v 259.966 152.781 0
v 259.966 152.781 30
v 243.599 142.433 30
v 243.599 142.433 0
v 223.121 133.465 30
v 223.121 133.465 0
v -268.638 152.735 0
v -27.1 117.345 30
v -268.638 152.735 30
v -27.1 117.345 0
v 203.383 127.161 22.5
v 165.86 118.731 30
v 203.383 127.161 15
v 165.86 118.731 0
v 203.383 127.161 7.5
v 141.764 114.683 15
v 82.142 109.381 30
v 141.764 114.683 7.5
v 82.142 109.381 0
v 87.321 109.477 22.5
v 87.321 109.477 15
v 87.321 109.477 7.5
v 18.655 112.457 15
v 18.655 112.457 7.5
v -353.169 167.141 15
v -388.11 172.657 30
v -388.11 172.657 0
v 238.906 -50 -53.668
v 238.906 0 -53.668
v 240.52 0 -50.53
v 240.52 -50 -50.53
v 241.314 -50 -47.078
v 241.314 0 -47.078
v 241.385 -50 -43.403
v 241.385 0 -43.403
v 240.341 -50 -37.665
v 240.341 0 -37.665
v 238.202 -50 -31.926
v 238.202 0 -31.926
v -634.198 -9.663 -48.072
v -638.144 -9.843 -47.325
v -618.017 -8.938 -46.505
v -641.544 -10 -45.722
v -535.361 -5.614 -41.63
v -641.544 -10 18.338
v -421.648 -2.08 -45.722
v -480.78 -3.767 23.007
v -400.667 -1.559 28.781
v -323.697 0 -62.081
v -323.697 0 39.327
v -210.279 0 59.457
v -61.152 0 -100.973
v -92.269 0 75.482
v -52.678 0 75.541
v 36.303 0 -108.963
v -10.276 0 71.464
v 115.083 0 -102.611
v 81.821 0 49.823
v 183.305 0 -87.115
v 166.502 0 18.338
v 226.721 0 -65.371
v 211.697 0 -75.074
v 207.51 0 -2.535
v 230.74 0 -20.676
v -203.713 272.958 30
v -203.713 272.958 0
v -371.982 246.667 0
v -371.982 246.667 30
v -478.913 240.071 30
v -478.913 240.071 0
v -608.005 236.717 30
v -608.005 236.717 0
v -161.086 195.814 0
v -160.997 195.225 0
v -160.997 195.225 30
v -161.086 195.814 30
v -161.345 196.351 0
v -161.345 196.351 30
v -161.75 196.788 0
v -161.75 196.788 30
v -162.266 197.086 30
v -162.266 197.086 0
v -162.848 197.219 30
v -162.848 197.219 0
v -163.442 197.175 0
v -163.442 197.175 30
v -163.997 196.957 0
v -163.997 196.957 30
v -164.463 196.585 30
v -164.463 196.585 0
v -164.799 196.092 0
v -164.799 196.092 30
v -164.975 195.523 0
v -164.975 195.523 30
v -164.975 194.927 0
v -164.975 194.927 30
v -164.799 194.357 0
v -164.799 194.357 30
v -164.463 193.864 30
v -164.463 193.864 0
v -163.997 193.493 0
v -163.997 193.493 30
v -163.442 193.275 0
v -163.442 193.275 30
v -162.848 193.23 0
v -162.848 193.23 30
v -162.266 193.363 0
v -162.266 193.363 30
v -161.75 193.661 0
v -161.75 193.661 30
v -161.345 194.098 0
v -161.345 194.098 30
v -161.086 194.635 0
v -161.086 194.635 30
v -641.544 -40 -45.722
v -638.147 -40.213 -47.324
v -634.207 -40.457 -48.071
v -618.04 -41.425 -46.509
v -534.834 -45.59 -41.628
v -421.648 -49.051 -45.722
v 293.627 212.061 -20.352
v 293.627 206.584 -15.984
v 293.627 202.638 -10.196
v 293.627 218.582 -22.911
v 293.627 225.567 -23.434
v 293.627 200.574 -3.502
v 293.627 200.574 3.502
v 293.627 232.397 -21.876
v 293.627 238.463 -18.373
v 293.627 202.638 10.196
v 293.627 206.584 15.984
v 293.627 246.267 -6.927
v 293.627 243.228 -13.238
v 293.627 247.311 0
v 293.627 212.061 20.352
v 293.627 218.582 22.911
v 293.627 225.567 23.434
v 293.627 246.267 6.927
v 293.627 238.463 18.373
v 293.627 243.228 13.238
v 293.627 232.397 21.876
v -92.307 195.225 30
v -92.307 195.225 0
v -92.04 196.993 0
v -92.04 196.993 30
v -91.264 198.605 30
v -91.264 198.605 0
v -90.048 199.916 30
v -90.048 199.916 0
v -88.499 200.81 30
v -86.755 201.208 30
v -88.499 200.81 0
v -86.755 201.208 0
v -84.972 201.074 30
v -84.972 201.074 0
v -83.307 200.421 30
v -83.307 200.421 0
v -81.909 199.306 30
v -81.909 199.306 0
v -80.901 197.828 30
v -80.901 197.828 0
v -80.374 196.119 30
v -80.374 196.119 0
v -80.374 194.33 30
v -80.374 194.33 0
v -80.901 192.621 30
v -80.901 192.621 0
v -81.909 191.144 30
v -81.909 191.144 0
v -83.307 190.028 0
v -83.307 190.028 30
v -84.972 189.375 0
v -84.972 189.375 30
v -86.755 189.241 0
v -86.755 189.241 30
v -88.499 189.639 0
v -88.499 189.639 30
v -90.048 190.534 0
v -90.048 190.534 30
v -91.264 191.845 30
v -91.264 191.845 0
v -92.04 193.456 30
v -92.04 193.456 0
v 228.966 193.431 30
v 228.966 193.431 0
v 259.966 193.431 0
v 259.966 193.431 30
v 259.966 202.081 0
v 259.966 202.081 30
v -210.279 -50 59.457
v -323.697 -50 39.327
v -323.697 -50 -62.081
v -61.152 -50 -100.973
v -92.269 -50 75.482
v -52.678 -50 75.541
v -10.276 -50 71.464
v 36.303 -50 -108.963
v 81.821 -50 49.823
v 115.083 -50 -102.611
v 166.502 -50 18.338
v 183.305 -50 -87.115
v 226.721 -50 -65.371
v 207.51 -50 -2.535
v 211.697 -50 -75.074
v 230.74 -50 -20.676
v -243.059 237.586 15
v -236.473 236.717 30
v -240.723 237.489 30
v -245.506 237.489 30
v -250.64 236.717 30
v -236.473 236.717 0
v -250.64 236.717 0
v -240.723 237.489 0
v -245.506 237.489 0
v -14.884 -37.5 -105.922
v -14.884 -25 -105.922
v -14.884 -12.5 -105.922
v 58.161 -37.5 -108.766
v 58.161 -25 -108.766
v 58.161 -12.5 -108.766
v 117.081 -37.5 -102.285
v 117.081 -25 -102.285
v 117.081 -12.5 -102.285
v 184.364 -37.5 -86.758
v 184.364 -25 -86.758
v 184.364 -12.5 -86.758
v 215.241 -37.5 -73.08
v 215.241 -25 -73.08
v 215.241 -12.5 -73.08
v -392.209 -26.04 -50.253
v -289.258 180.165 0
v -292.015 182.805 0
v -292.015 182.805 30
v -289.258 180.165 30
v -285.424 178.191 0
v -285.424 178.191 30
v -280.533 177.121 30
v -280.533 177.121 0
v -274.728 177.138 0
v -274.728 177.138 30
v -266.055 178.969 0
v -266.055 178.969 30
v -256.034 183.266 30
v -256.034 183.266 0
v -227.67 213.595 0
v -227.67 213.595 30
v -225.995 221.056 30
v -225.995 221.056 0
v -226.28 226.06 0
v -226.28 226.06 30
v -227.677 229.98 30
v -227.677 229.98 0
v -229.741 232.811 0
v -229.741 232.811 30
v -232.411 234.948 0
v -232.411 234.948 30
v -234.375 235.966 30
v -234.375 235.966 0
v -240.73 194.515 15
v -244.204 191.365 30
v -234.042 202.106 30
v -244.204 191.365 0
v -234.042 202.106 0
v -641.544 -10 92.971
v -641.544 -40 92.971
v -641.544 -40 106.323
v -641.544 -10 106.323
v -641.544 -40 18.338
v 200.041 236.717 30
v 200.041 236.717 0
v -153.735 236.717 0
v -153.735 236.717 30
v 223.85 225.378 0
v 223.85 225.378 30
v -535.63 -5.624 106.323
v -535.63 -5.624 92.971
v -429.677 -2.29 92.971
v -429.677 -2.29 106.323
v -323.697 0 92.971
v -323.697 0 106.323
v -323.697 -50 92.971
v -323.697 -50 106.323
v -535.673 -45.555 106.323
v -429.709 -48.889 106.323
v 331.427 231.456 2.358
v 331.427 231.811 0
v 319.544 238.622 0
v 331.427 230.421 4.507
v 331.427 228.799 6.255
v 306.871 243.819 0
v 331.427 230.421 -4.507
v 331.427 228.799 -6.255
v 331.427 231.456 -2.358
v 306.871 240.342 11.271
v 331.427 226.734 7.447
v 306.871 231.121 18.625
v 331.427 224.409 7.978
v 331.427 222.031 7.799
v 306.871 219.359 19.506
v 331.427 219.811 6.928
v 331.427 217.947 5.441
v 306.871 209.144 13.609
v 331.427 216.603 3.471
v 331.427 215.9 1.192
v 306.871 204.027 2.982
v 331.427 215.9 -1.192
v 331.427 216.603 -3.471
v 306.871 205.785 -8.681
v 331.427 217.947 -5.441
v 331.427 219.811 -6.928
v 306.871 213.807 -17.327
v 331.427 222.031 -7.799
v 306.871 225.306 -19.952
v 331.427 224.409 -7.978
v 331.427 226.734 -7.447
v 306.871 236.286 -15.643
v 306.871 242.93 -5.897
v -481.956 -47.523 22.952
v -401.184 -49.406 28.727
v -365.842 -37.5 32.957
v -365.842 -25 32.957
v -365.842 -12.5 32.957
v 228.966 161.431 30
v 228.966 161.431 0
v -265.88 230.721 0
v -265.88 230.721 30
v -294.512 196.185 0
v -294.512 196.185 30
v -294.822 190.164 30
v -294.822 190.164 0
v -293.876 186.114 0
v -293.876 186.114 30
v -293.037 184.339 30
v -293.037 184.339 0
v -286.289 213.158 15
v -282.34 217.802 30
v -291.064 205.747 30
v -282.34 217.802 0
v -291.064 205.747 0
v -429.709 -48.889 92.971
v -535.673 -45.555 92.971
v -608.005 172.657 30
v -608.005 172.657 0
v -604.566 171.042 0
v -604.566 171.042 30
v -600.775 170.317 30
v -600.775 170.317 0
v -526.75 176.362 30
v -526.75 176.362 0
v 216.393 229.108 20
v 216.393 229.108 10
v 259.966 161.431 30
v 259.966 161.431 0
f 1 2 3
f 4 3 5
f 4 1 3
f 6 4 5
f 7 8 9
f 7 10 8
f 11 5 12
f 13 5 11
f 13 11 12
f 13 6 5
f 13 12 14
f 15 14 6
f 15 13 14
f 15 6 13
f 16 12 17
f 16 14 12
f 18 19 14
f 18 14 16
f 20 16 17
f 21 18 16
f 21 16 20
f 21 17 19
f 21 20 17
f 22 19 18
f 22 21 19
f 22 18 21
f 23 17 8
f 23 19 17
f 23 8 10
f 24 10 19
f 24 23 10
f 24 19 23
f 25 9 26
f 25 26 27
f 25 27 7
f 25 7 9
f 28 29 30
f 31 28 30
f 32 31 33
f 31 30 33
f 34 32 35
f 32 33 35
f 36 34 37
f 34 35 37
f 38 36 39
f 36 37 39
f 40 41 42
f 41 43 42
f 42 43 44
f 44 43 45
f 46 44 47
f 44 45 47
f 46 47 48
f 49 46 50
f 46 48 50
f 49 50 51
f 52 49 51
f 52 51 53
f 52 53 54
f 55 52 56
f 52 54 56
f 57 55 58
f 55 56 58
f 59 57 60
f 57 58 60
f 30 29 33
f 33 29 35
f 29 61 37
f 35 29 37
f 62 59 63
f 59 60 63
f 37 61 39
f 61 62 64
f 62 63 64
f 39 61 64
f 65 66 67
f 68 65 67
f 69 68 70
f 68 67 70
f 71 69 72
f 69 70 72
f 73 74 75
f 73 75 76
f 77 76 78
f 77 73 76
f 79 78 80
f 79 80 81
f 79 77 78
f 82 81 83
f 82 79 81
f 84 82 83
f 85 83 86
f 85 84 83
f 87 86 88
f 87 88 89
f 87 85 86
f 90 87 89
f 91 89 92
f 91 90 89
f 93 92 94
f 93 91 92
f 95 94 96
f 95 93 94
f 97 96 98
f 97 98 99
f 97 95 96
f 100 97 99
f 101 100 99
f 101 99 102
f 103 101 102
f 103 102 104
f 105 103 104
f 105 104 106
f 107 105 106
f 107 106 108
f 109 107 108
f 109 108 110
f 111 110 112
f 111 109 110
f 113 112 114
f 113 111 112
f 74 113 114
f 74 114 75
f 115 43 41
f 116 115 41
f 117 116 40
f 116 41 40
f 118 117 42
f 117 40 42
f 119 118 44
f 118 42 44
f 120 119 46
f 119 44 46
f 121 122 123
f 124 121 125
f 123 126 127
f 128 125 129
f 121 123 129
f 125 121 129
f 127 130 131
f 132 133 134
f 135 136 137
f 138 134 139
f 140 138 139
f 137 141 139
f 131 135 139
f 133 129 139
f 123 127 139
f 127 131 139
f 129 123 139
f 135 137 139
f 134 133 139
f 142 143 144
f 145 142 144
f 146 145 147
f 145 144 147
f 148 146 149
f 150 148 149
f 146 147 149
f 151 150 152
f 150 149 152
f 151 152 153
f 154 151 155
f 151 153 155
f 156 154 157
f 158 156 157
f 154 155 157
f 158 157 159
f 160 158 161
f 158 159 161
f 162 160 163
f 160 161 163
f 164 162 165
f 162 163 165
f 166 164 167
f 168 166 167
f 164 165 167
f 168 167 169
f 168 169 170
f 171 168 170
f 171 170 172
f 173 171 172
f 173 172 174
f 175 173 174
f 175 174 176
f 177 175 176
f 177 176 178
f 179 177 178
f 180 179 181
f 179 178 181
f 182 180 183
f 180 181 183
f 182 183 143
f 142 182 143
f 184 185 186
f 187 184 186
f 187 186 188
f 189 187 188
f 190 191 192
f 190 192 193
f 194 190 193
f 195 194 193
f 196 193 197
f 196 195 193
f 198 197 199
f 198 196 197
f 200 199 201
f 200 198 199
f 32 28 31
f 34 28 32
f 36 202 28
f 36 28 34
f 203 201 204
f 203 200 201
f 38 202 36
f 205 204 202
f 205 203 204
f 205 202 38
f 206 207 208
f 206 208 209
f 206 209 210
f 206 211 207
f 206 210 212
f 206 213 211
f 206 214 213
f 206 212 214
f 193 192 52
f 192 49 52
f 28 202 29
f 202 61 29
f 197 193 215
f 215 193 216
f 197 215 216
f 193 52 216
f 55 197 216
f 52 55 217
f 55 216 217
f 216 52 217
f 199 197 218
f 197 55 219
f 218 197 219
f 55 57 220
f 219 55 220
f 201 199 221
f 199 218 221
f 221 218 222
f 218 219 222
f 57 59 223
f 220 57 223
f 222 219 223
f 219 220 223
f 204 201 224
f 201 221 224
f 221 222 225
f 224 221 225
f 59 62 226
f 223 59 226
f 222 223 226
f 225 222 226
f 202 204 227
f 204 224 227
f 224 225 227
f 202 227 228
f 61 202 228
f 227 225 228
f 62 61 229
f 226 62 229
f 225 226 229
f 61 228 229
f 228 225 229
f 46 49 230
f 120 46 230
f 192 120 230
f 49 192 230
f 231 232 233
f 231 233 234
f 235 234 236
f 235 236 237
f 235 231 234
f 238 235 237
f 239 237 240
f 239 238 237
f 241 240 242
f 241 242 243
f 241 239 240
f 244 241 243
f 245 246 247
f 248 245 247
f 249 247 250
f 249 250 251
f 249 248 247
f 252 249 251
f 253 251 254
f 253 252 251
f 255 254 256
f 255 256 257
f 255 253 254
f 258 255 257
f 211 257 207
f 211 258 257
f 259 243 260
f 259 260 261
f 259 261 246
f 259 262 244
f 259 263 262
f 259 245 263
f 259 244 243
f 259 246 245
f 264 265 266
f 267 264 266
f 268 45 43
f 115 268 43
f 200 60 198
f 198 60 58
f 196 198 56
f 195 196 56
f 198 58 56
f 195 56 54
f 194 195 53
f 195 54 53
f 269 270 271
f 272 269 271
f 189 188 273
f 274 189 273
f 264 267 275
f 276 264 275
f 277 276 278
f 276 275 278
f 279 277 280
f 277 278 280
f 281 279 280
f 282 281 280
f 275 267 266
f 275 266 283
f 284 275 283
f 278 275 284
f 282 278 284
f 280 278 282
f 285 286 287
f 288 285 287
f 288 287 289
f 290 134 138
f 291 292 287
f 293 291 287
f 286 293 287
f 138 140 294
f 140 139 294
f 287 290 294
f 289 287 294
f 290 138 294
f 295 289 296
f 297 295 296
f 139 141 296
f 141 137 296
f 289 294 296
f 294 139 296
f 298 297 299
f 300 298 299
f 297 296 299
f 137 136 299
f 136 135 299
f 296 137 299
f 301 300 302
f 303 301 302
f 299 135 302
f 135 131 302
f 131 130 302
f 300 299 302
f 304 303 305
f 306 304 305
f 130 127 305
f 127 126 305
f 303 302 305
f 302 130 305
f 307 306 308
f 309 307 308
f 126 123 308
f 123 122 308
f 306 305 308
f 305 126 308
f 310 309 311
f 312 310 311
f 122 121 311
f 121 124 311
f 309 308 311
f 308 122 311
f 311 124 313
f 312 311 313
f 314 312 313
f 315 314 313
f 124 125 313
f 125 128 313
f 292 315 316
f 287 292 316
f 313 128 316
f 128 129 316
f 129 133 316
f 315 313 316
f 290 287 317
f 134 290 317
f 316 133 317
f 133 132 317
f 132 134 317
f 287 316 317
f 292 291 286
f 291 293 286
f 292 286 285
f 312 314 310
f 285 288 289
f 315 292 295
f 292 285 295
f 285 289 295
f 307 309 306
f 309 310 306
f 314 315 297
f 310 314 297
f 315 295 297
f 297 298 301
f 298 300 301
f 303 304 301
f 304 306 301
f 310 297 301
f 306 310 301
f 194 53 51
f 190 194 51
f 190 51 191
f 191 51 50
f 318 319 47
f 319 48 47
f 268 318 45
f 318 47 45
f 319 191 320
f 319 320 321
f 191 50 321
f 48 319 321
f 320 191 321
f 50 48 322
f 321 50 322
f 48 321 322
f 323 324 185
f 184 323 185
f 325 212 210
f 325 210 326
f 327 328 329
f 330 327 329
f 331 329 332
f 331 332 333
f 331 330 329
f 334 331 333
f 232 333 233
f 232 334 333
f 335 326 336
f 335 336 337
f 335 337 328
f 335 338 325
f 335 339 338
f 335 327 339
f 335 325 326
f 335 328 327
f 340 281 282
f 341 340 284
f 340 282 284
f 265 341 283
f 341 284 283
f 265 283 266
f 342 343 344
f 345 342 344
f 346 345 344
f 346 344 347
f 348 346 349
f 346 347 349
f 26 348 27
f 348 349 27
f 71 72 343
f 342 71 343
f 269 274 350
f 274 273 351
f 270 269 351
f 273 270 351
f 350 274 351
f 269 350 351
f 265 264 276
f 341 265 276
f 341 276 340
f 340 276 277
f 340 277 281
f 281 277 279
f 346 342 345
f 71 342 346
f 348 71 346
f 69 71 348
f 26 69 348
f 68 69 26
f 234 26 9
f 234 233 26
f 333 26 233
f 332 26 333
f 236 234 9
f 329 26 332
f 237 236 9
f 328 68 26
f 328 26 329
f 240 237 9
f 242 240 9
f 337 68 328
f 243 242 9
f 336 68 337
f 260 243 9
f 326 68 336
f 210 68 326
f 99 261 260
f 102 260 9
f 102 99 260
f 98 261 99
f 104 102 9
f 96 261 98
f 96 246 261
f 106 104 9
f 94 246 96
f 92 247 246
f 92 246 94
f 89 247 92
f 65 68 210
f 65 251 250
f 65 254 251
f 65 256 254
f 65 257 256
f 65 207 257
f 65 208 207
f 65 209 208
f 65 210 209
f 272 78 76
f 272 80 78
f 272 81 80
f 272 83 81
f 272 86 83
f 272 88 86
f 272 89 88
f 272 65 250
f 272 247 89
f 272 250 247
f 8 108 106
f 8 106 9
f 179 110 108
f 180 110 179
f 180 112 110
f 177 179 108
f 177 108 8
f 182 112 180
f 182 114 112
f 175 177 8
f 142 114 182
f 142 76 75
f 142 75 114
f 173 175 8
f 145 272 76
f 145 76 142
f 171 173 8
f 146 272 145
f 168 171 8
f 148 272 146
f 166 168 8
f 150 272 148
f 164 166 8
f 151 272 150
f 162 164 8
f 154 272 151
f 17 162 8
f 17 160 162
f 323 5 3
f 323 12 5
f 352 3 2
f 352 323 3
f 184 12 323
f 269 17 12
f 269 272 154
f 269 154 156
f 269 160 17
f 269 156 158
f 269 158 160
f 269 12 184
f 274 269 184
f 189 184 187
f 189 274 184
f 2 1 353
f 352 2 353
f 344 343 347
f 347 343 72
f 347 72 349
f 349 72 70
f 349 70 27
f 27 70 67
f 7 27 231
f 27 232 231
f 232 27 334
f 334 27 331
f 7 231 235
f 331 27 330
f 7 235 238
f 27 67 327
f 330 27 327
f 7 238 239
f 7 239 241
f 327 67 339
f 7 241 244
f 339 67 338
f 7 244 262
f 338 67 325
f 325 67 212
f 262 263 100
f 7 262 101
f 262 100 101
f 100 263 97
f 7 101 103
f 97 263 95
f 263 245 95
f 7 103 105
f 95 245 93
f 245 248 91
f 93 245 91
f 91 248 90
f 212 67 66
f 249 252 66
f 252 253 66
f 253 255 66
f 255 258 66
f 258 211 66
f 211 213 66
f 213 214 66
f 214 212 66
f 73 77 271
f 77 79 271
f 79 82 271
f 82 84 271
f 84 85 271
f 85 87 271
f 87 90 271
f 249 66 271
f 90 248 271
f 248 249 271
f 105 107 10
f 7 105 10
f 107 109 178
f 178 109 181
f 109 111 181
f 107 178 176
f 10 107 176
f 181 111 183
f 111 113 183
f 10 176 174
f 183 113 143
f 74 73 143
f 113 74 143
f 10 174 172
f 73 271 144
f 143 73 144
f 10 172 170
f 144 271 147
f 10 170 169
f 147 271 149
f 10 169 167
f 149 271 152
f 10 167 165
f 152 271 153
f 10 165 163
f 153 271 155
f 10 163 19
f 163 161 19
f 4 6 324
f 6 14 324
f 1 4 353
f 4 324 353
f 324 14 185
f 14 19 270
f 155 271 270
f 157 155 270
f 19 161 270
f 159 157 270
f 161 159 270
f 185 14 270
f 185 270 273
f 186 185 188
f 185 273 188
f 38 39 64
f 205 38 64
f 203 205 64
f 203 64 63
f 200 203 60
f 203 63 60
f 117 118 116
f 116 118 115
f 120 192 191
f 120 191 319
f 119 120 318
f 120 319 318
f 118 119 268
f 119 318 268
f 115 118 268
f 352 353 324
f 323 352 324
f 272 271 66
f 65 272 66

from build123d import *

# Parameters (mm, degrees)
F1_DEPTH = 50
F0_W     = 317.8466722451
F0_H     = 13.3516192436
F3_DEPTH = 1500
F6_W     = 100
F6_H     = 8
F6_R     = 2
F7_DEPTH = 30


with BuildPart() as f1:
    # F0 (on Front) → F1 (new body)
    with BuildSketch(Plane.XZ):
        with BuildLine():
            Line((-92.2688558526, 18.3382586387), (-641.5441498242, 18.3382586387))
            Line((-641.5441498242, 18.3382586387), (-641.5441498242, -45.7217364761))
            add(Edge.make_bspline(
                [(-641.5441498242, -45.7217364761), (-634.7905397415, -50.0761270524), (-604.8932332178, -41.2842312856), (-506.8314957663, -39.6971155018), (-421.6484069347, -45.7217364761)],
                knots=[0, 0, 0, 0, 0.2796888649, 1, 1, 1, 1], degree=3))
            add(Edge.make_bspline(
                [(-92.2688558526, -97.0879061647), (-193.8096296355, -83.8930034142), (-378.50831803, -53.3303829833), (-413.4133160114, -46.2517477573), (-421.6484069347, -45.7217364761)],
                knots=[0.5566081187, 0.5566081187, 0.5566081187, 0.5566081187, 0.862887202, 1, 1, 1, 1], degree=3))
            Line((-92.2688558526, -97.0879061647), (-92.2688558526, 18.3382586387))
        make_face()
        with BuildLine():
            Line((166.5022664445, 18.3382586387), (-92.2688558526, 18.3382586387))
            Line((-92.2688558526, 18.3382586387), (-92.2688558526, -97.0879061647))
            add(Edge.make_bspline(
                [(238.9060020924, -53.6676838252), (214.0259390291, -83.879161814), (104.3641030377, -106.8449990114), (35.4021859771, -112.3363976445), (-63.6852582604, -100.8022543663), (-92.2688558526, -97.0879061647)],
                knots=[0, 0, 0, 0, 0.2344718991, 0.4703909496, 0.5566081187, 0.5566081187, 0.5566081187, 0.5566081187], degree=3))
            add(Edge.make_bspline(
                [(238.9060020924, -53.6676838252), (242.7234113693, -48.1862842295), (241.7380916069, -40.0359209618), (238.4489816883, -32.4629603062), (238.2021409461, -31.9258788924)],
                knots=[0, 0, 0, 0, 0.0586221346, 0.0631195824, 0.0631195824, 0.0631195824, 0.0631195824], degree=3))
            add(Edge.make_bspline(
                [(238.2021409461, -31.9258788924), (233.634977015, -21.9885450492), (219.6243183798, -7.6030613206), (182.3729880207, 11.2734958473), (166.5022664445, 18.3382586386)],
                knots=[0.0631195824, 0.0631195824, 0.0631195824, 0.0631195824, 0.1463334835, 0.1950005061, 0.1950005061, 0.1950005061, 0.1950005061], degree=3))
        make_face()
        with BuildLine():
            Line((-92.2688558526, 75.4822293566), (-92.2688558526, 18.3382586387))
            Line((-92.2688558526, 18.3382586387), (166.5022664445, 18.3382586387))
            add(Edge.make_bspline(
                [(166.5022664445, 18.3382586386), (118.1504529994, 39.861797495), (14.8777125002, 73.9100474389), (-66.0355828244, 76.6980963515), (-92.2688558526, 75.4822293566)],
                knots=[0.1950005061, 0.1950005061, 0.1950005061, 0.1950005061, 0.3432696814, 0.4199554493, 0.4199554493, 0.4199554493, 0.4199554493], degree=3))
        make_face()
        with BuildLine():
            add(Edge.make_bspline(
                [(-92.2688558526, 75.4822293566), (-126.4459647483, 73.8981792593), (-210.2145894378, 60.0771392783), (-343.8378962034, 34.2516843542), (-458.8172888723, 22.2125576311), (-576.1514595784, 19.726094248), (-641.5441498242, 18.3382586387)],
                knots=[0.4199554493, 0.4199554493, 0.4199554493, 0.4199554493, 0.5198628393, 0.6824214237, 0.8229949084, 1, 1, 1, 1], degree=3))
            Line((-641.5441498242, 18.3382586387), (-92.2688558526, 18.3382586387))
            Line((-92.2688558526, 18.3382586387), (-92.2688558526, 75.4822293566))
        make_face()
    extrude(amount=F1_DEPTH)


with BuildPart() as f1b:
    # F0 (on Front) → F1, piece 2 (new body)
    with BuildSketch(Plane.XZ):
        with Locations((-482.6208137017, 99.6472090483)):
            Rectangle(F0_W, F0_H)
    extrude(amount=F1_DEPTH)


with BuildPart() as f3_tool:
    # F2 (on face) → F3 (new body)
    with BuildSketch(Plane.XY.offset(106.3230186701)):
        with BuildLine():
            Line((-641.5441498242, 0), (-641.5441498242, -10))
            ThreePointArc((-641.5441498242, -10), (-482.6577376344, -3.8263850851), (-323.6974775791, 0))
            Line((-323.6974775791, 0), (-641.5441498242, 0))
        make_face()
        with BuildLine():
            ThreePointArc((-323.6974775791, -50), (-482.6994485239, -47.4993816565), (-641.5441498242, -40))
            Line((-641.5441498242, -40), (-641.5441498242, -50))
            Line((-641.5441498242, -50), (-323.6974775791, -50))
        make_face()
    extrude(amount=-F3_DEPTH)


with BuildPart() as f1_1:
    add(f1.part)

    # F3: cut by f3_tool
    add(f3_tool.part, mode=Mode.SUBTRACT)


with BuildPart() as f1b_1:
    add(f1b.part)

    # F3: cut by f3_tool
    add(f3_tool.part, mode=Mode.SUBTRACT)


with BuildPart() as f5:
    # F4 (on Top) → F5 (revolve)
    with BuildSketch(Plane.XY):
        with BuildLine():
            Line((293.6271727085, 247.3111026287), (293.6271727085, 223.8111026287))
            Line((293.6271727085, 223.8111026287), (331.4271727085, 223.8111026287))
            Line((331.4271727085, 223.8111026287), (331.4271727085, 231.8111026287))
            ThreePointArc((331.4271727085, 231.8111026287), (313.2929954526, 241.428721966), (293.6271727085, 247.3111026287))
        make_face()
    revolve(axis=Axis((312.5271727085, 223.8111026287, 0), (1, 0, 0)))


with BuildPart() as f7:
    # F6 (on Top) → F7 (new body)
    with BuildSketch(Plane.XY):
        with Locations((-558.0053578582, 212.717464368)):
            Rectangle(F6_W, F6_H)
        with BuildLine():
            Line((-250.6401846367, 236.7174643679), (-608.0053578582, 236.7174643679))
            Line((-608.0053578582, 236.7174643679), (-608.0053578582, 216.717464368))
            Line((-608.0053578582, 216.717464368), (-508.0053578582, 216.717464368))
            Line((-508.0053578582, 216.717464368), (-508.0053578582, 208.717464368))
            Line((-508.0053578582, 208.717464368), (-608.0053578582, 208.717464368))
            Line((-608.0053578582, 208.717464368), (-608.0053578582, 172.6574692531))
            add(Edge.make_bspline(
                [(-608.0053578582, 172.6574692531), (-601.2517477755, 168.3030786769), (-571.3544412517, 177.0949744437), (-473.2927038003, 178.6820902275), (-388.1096149687, 172.6574692531)],
                knots=[0, 0, 0, 0, 0.2796888649, 1, 1, 1, 1], degree=3))
            add(Edge.make_bspline(
                [(259.9661303996, 152.7812669099), (232.0815068677, 131.2964826553), (133.7182142458, 111.2009829448), (30.9940058765, 103.0211120616), (-338.1822792938, 163.6723882279), (-379.8745240454, 172.127457972), (-388.1096149687, 172.6574692531)],
                knots=[0.0337755588, 0.0337755588, 0.0337755588, 0.0337755588, 0.2344718991, 0.4703909496, 0.862887202, 1, 1, 1, 1], degree=3))
            Line((259.9661303996, 152.7812669099), (259.9661303996, 161.4312250318))
            Line((259.9661303996, 161.4312250318), (228.9661303996, 161.4312250318))
            Line((228.9661303996, 161.4312250318), (228.9661303996, 177.4312250318))
            Line((228.9661303996, 177.4312250318), (228.9661303996, 186.453326837))
            Line((228.9661303996, 186.453326837), (228.9661303996, 193.4312250318))
            Line((228.9661303996, 193.4312250318), (259.9661303996, 193.4312250318))
            Line((259.9661303996, 193.4312250318), (259.9661303996, 202.0811831537))
            add(Edge.make_bspline(
                [(259.9661303996, 202.0811831537), (255.0551260661, 206.6227472636), (244.9596827646, 213.9663165186), (229.9083399795, 222.2675736066), (223.8504781828, 225.3777306739)],
                knots=[0.1076722035, 0.1076722035, 0.1076722035, 0.1076722035, 0.1463334835, 0.168572427, 0.168572427, 0.168572427, 0.168572427], degree=3))
            Line((223.8504781828, 225.3777306739), (204.9262002253, 205.3693207323))
            Line((204.9262002253, 205.3693207323), (-153.734513735, 236.717464368))
            Line((-153.734513735, 236.7174643679), (-236.4731576708, 236.7174643679))
            add(Edge.make_bspline(
                [(-292.0151650906, 182.805031538), (-275.176870524, 161.0782124027), (-240.7297962269, 194.5146268484), (-206.2827219298, 227.9510412941), (-236.4731576708, 236.7174643679)],
                knots=[0, 0, 0, 1.765837173, 1.765837173, 3.5316743461, 3.5316743461, 3.5316743461], degree=2, weights=[1, 0.6348989656, 1, 0.6348989656, 1]))
            add(Edge.make_bspline(
                [(-250.6401846367, 236.7174643679), (-321.7854800529, 221.2183189544), (-292.0151650906, 182.805031538)],
                knots=[4.0117811687, 4.0117811687, 4.0117811687, 6.2831853072, 6.2831853072, 6.2831853072], degree=2, weights=[1, 0.4214958788, 1]))
        make_face()
        Polygon((-12.2165865784, 195.8500338705), (-11.0413590846, 195.0440865754), (-10.2569755968, 194.3944768828), (-9.7286623198, 193.8688590816), (-9.3701640247, 193.4375829371), (-9.1302666693, 193.0143932203), (-8.9847109705, 192.4806889915), (-8.9415833561, 192.1194952205), (-9.0143612054, 191.936202859), (-9.1895671391, 191.5723136121), (-9.4779830608, 191.1706877025), (-9.9038682535, 190.7879301243), (-10.5157412835, 190.3701313593), (-11.3998573798, 189.8795547449), (-12.7179450964, 189.2784636185), (-14.5751279937, 188.6045946427), (-16.8420232283, 187.95498495), (-19.3434248665, 187.3781531067), (-21.9769048239, 186.868708161), (-24.6885535825, 186.423954637), (-27.4379390038, 186.0438925346), (-30.2250610877, 185.7123489985), (-33.0364424548, 185.4266285528), (-35.8639966772, 185.1759492938), (-38.7023328033, 184.9576157457), (-41.551450833, 184.7689324324), (-44.4086552904, 184.6045084023), (-47.2766416514, 184.4616481795), (-50.1500189642, 184.3430472397), (-53.023396277, 184.2406191554), (-55.9021645416, 184.1543639265), (-58.7836282821, 184.0896725048), (-61.6704829745, 184.0357629868), (-64.5600331427, 183.9953308482), (-67.4522787868, 183.9683760892), (-70.341828955, 183.9522032338), (-73.2340745992, 183.9522032338), (-76.1290157192, 183.9575941856), (-79.0266523152, 183.973767041), (-81.9242889111, 184.0007218), (-84.821925507, 184.0384584627), (-87.7222575789, 184.0815860771), (-90.6198941748, 184.1328001193), (-93.5202262467, 184.1921005891), (-96.4232537944, 184.2621829626), (-99.3235858663, 184.334960812), (-102.226613414, 184.4158250891), (-105.1296409617, 184.502080318), (-108.0299730336, 184.5937264987), (-110.9356960572, 184.696154583), (-113.838723605, 184.8012781433), (-116.7417511527, 184.9090971794), (-119.6474741764, 185.0276981191), (-122.5505017241, 185.1462990589), (-125.4535292719, 185.2675954745), (-128.3592522955, 185.3915873661), (-131.2622798433, 185.5209702094), (-134.1680028669, 185.6557440046), (-137.0683349388, 185.7932132756), (-139.9713624865, 185.9333780226), (-142.8770855102, 186.0762382455), (-145.7801130579, 186.2190984684), (-148.6804451298, 186.367349643), (-151.5807772016, 186.5209917695), (-154.4811092734, 186.674633896), (-157.3814413453, 186.8336669743), (-160.2817734171, 186.9980910044), (-163.182105489, 187.1652105104), (-166.0824375608, 187.3350254923), (-168.9827696327, 187.510231426), (-171.8857971804, 187.6908283115), (-174.7888247281, 187.8687297211), (-176.8647465604, 187.9954782198), (-183.7571243637, 202.0062016985), (-180.8617319379, 202.2733529478), (-177.9694862939, 202.5375095863), (-175.0745451739, 202.7989707489), (-172.1822995298, 203.0523454838), (-169.2900538856, 203.3003292669), (-166.3978082415, 203.5429220982), (-163.5028671214, 203.7747330259), (-160.6106214773, 204.0011530018), (-157.7156803573, 204.2194865499), (-154.8234347131, 204.4297336704), (-151.9284935931, 204.634589839), (-149.036247949, 204.8259686281), (-146.1440023048, 205.0146519414), (-143.2490611848, 205.1952488269), (-140.3568155407, 205.3677592847), (-137.4618744206, 205.5321833148), (-134.5669333006, 205.6885209172), (-131.6773831324, 205.8394675677), (-128.7797465364, 205.9796323147), (-125.8875008923, 206.111710634), (-122.9952552482, 206.2357025255), (-120.103009604, 206.3516079894), (-117.208068484, 206.4567315496), (-114.3185183158, 206.5537686821), (-111.4235771957, 206.640023911), (-108.5340270275, 206.7128017604), (-105.6444768593, 206.7774931821), (-102.7522312151, 206.8287072242), (-99.8653765228, 206.8664438869), (-96.9758263546, 206.8960941218), (-94.0916671391, 206.9095715013), (-91.202116969, 206.9095715013), (-88.3206532294, 206.8960941218), (-85.4337985371, 206.8691393628), (-82.5550302724, 206.8287072242), (-79.6735665319, 206.7694067543), (-76.7974937432, 206.696628905), (-73.9214209545, 206.6022872484), (-71.0507391176, 206.4917727363), (-68.1773618048, 206.362389893), (-65.3093754438, 206.2114432424), (-62.4494755105, 206.0416282605), (-59.5868801013, 205.8475539955), (-56.7323711198, 205.6292204473), (-53.885948566, 205.3893230919), (-51.0422214881, 205.1197755016), (-48.206580838, 204.8232731522), (-45.3790266155, 204.4917296161), (-42.5595588208, 204.1305358451), (-39.7562638814, 203.7316054114), (-36.9664463216, 203.2922428392), (-34.1928016172, 202.8124481284), (-31.4380252442, 202.2814393755), (-28.712899106, 201.7019120563), (-26.0201186787, 201.0603887914), (-23.3758568177, 200.3514786288), (-20.7962863783, 199.5724860928), (-18.3137530715, 198.7261066592), (-15.9767754634, 197.7961674726), (-13.8850861625, 196.8042323402), align=None, mode=Mode.SUBTRACT)
        with BuildLine():
            add(Edge.make_bspline(
                [(-203.7130657509, 272.9584963955), (-240.820726705, 266.2190918688), (-321.7536265031, 251.4315234673), (-425.2784969062, 240.5917633604), (-542.6126676123, 238.1052999772), (-608.0053578582, 236.7174643679)],
                knots=[0.5676952523, 0.5676952523, 0.5676952523, 0.5676952523, 0.6824214237, 0.8229949084, 1, 1, 1, 1], degree=3))
            Line((-608.0053578582, 236.7174643679), (-250.6401846367, 236.7174643679))
            add(Edge.make_bspline(
                [(-236.4731576708, 236.7174643679), (-242.5459170902, 238.4808168003), (-250.6401846367, 236.7174643679)],
                knots=[3.5316743461, 3.5316743461, 3.5316743461, 4.0117811687, 4.0117811687, 4.0117811687], degree=2, weights=[1, 0.9713252775, 1]))
            Line((-236.4731576708, 236.7174643679), (-153.734513735, 236.7174643679))
            Line((-153.734513735, 236.7174643679), (-203.7130657509, 272.9584963955))
        make_face()
        with BuildLine():
            add(Edge.make_bspline(
                [(223.8504781828, 225.3777306739), (216.6515008414, 229.0737460349), (208.659475201, 232.8810244196), (200.0410584104, 236.7174643679)],
                knots=[0.168572427, 0.168572427, 0.168572427, 0.168572427, 0.1950005061, 0.1950005061, 0.1950005061, 0.1950005061], degree=3))
            Line((200.0410584104, 236.7174643679), (-153.734513735, 236.7174643679))
            Line((-153.734513735, 236.717464368), (204.9262002253, 205.3693207323))
            Line((204.9262002253, 205.3693207323), (223.8504781828, 225.3777306739))
        make_face()
        Polygon((-10.2569755968, 194.3944768828), (-11.0413590846, 195.0440865754), (-12.2165865784, 195.8500338705), (-13.8850861625, 196.8042323402), (-15.9767754634, 197.7961674726), (-18.3137530715, 198.7261066592), (-20.7962863783, 199.5724860928), (-23.3758568177, 200.3514786288), (-26.0201186787, 201.0603887914), (-28.712899106, 201.7019120563), (-31.4380252442, 202.2814393755), (-34.1928016172, 202.8124481285), (-36.9664463216, 203.2922428392), (-39.7562638814, 203.7316054114), (-42.5595588208, 204.1305358451), (-45.3790266155, 204.4917296161), (-48.206580838, 204.8232731522), (-51.0422214881, 205.1197755016), (-53.885948566, 205.3893230919), (-56.7323711198, 205.6292204473), (-59.5868801013, 205.8475539955), (-62.4494755105, 206.0416282605), (-65.3093754438, 206.2114432424), (-68.1773618048, 206.362389893), (-71.0507391176, 206.4917727363), (-73.9214209545, 206.6022872484), (-76.7974937432, 206.696628905), (-79.6735665319, 206.7694067543), (-82.5550302724, 206.8287072242), (-85.4337985371, 206.8691393628), (-88.3206532294, 206.8960941218), (-91.2021169699, 206.9095715013), (-94.0916671391, 206.9095715013), (-96.9758263546, 206.8960941218), (-99.8653765228, 206.8664438869), (-102.7522312151, 206.8287072242), (-105.6444768593, 206.7774931821), (-108.5340270275, 206.7128017604), (-111.4235771957, 206.640023911), (-114.3185183158, 206.5537686821), (-117.208068484, 206.4567315496), (-120.103009604, 206.3516079894), (-122.9952552482, 206.2357025255), (-125.8875008923, 206.111710634), (-128.7797465364, 205.9796323147), (-131.6773831324, 205.8394675677), (-134.5669333006, 205.6885209172), (-137.4618744206, 205.5321833148), (-140.3568155407, 205.3677592847), (-143.2490611848, 205.1952488269), (-146.1440023048, 205.0146519414), (-149.036247949, 204.8259686281), (-151.9284935931, 204.634589839), (-154.8234347131, 204.4297336704), (-157.7156803573, 204.2194865499), (-160.6106214773, 204.0011530018), (-163.5028671214, 203.7747330259), (-166.3978082415, 203.5429220982), (-169.2900538856, 203.3003292669), (-172.1822995298, 203.0523454838), (-175.0745451739, 202.7989707489), (-177.9694862939, 202.5375095863), (-180.8617319379, 202.2733529478), (-183.7571243637, 202.0062016985), (-176.8647465604, 187.9954782198), (-174.7888247281, 187.8687297211), (-171.8857971804, 187.6908283115), (-168.9827696327, 187.510231426), (-166.0824375608, 187.3350254923), (-163.182105489, 187.1652105104), (-160.2817734171, 186.9980910044), (-157.3814413453, 186.8336669743), (-154.4811092734, 186.674633896), (-151.5807772016, 186.5209917695), (-148.6804451298, 186.367349643), (-145.7801130579, 186.2190984683), (-142.8770855102, 186.0762382455), (-139.9713624865, 185.9333780226), (-137.0683349388, 185.7932132756), (-134.1680028669, 185.6557440046), (-131.2622798433, 185.5209702094), (-128.3592522955, 185.3915873661), (-125.4535292719, 185.2675954745), (-122.5505017241, 185.1462990589), (-119.6474741764, 185.0276981191), (-116.7417511527, 184.9090971794), (-113.838723605, 184.8012781433), (-110.9356960572, 184.696154583), (-108.0299730336, 184.5937264987), (-105.1296409617, 184.502080318), (-102.226613414, 184.4158250891), (-99.3235858663, 184.334960812), (-96.4232537944, 184.2621829626), (-93.5202262467, 184.1921005891), (-90.6198941748, 184.1328001193), (-87.7222575789, 184.0815860771), (-84.821925507, 184.0384584627), (-81.9242889111, 184.0007218), (-79.0266523152, 183.973767041), (-76.1290157192, 183.9575941856), (-73.2340745992, 183.9522032338), (-70.341828955, 183.9522032338), (-67.4522787868, 183.9683760892), (-64.5600331427, 183.9953308482), (-61.6704829745, 184.0357629868), (-58.7836282821, 184.0896725048), (-55.9021645416, 184.1543639265), (-53.023396277, 184.2406191554), (-50.1500189642, 184.3430472397), (-47.2766416514, 184.4616481795), (-44.4086552904, 184.6045084023), (-41.551450833, 184.7689324324), (-38.7023328033, 184.9576157457), (-35.8639966772, 185.1759492938), (-33.0364424548, 185.4266285528), (-30.2250610877, 185.7123489985), (-27.4379390038, 186.0438925346), (-24.6885535825, 186.423954637), (-21.9769048239, 186.868708161), (-19.3434248665, 187.3781531067), (-16.8420232283, 187.95498495), (-14.5751279937, 188.6045946427), (-12.7179450964, 189.2784636185), (-11.3998573798, 189.8795547449), (-10.5157412835, 190.3701313593), (-9.9038682535, 190.7879301243), (-9.4779830608, 191.1706877025), (-9.1895671391, 191.5723136121), (-9.0143612054, 191.936202859), (-8.9415833561, 192.1194952205), (-8.9847109705, 192.4806889915), (-9.1302666693, 193.0143932203), (-9.3701640247, 193.4375829371), (-9.7286623198, 193.8688590816), align=None)
        with Locations((-162.997122293, 195.2246472574)):
            Circle(F6_R, mode=Mode.SUBTRACT)
        with BuildLine():
            ThreePointArc((-80.3069402032, 195.2246472574), (-86.3069402032, 189.2246472574), (-92.3069402032, 195.2246472574))
            ThreePointArc((-92.3069402032, 195.2246472574), (-86.3069402032, 201.2246472574), (-80.3069402032, 195.2246472574))
        make_face(mode=Mode.SUBTRACT)
    extrude(amount=F7_DEPTH)


solid = Compound([f1_1.part, f1b_1.part, f5.part, f7.part])
